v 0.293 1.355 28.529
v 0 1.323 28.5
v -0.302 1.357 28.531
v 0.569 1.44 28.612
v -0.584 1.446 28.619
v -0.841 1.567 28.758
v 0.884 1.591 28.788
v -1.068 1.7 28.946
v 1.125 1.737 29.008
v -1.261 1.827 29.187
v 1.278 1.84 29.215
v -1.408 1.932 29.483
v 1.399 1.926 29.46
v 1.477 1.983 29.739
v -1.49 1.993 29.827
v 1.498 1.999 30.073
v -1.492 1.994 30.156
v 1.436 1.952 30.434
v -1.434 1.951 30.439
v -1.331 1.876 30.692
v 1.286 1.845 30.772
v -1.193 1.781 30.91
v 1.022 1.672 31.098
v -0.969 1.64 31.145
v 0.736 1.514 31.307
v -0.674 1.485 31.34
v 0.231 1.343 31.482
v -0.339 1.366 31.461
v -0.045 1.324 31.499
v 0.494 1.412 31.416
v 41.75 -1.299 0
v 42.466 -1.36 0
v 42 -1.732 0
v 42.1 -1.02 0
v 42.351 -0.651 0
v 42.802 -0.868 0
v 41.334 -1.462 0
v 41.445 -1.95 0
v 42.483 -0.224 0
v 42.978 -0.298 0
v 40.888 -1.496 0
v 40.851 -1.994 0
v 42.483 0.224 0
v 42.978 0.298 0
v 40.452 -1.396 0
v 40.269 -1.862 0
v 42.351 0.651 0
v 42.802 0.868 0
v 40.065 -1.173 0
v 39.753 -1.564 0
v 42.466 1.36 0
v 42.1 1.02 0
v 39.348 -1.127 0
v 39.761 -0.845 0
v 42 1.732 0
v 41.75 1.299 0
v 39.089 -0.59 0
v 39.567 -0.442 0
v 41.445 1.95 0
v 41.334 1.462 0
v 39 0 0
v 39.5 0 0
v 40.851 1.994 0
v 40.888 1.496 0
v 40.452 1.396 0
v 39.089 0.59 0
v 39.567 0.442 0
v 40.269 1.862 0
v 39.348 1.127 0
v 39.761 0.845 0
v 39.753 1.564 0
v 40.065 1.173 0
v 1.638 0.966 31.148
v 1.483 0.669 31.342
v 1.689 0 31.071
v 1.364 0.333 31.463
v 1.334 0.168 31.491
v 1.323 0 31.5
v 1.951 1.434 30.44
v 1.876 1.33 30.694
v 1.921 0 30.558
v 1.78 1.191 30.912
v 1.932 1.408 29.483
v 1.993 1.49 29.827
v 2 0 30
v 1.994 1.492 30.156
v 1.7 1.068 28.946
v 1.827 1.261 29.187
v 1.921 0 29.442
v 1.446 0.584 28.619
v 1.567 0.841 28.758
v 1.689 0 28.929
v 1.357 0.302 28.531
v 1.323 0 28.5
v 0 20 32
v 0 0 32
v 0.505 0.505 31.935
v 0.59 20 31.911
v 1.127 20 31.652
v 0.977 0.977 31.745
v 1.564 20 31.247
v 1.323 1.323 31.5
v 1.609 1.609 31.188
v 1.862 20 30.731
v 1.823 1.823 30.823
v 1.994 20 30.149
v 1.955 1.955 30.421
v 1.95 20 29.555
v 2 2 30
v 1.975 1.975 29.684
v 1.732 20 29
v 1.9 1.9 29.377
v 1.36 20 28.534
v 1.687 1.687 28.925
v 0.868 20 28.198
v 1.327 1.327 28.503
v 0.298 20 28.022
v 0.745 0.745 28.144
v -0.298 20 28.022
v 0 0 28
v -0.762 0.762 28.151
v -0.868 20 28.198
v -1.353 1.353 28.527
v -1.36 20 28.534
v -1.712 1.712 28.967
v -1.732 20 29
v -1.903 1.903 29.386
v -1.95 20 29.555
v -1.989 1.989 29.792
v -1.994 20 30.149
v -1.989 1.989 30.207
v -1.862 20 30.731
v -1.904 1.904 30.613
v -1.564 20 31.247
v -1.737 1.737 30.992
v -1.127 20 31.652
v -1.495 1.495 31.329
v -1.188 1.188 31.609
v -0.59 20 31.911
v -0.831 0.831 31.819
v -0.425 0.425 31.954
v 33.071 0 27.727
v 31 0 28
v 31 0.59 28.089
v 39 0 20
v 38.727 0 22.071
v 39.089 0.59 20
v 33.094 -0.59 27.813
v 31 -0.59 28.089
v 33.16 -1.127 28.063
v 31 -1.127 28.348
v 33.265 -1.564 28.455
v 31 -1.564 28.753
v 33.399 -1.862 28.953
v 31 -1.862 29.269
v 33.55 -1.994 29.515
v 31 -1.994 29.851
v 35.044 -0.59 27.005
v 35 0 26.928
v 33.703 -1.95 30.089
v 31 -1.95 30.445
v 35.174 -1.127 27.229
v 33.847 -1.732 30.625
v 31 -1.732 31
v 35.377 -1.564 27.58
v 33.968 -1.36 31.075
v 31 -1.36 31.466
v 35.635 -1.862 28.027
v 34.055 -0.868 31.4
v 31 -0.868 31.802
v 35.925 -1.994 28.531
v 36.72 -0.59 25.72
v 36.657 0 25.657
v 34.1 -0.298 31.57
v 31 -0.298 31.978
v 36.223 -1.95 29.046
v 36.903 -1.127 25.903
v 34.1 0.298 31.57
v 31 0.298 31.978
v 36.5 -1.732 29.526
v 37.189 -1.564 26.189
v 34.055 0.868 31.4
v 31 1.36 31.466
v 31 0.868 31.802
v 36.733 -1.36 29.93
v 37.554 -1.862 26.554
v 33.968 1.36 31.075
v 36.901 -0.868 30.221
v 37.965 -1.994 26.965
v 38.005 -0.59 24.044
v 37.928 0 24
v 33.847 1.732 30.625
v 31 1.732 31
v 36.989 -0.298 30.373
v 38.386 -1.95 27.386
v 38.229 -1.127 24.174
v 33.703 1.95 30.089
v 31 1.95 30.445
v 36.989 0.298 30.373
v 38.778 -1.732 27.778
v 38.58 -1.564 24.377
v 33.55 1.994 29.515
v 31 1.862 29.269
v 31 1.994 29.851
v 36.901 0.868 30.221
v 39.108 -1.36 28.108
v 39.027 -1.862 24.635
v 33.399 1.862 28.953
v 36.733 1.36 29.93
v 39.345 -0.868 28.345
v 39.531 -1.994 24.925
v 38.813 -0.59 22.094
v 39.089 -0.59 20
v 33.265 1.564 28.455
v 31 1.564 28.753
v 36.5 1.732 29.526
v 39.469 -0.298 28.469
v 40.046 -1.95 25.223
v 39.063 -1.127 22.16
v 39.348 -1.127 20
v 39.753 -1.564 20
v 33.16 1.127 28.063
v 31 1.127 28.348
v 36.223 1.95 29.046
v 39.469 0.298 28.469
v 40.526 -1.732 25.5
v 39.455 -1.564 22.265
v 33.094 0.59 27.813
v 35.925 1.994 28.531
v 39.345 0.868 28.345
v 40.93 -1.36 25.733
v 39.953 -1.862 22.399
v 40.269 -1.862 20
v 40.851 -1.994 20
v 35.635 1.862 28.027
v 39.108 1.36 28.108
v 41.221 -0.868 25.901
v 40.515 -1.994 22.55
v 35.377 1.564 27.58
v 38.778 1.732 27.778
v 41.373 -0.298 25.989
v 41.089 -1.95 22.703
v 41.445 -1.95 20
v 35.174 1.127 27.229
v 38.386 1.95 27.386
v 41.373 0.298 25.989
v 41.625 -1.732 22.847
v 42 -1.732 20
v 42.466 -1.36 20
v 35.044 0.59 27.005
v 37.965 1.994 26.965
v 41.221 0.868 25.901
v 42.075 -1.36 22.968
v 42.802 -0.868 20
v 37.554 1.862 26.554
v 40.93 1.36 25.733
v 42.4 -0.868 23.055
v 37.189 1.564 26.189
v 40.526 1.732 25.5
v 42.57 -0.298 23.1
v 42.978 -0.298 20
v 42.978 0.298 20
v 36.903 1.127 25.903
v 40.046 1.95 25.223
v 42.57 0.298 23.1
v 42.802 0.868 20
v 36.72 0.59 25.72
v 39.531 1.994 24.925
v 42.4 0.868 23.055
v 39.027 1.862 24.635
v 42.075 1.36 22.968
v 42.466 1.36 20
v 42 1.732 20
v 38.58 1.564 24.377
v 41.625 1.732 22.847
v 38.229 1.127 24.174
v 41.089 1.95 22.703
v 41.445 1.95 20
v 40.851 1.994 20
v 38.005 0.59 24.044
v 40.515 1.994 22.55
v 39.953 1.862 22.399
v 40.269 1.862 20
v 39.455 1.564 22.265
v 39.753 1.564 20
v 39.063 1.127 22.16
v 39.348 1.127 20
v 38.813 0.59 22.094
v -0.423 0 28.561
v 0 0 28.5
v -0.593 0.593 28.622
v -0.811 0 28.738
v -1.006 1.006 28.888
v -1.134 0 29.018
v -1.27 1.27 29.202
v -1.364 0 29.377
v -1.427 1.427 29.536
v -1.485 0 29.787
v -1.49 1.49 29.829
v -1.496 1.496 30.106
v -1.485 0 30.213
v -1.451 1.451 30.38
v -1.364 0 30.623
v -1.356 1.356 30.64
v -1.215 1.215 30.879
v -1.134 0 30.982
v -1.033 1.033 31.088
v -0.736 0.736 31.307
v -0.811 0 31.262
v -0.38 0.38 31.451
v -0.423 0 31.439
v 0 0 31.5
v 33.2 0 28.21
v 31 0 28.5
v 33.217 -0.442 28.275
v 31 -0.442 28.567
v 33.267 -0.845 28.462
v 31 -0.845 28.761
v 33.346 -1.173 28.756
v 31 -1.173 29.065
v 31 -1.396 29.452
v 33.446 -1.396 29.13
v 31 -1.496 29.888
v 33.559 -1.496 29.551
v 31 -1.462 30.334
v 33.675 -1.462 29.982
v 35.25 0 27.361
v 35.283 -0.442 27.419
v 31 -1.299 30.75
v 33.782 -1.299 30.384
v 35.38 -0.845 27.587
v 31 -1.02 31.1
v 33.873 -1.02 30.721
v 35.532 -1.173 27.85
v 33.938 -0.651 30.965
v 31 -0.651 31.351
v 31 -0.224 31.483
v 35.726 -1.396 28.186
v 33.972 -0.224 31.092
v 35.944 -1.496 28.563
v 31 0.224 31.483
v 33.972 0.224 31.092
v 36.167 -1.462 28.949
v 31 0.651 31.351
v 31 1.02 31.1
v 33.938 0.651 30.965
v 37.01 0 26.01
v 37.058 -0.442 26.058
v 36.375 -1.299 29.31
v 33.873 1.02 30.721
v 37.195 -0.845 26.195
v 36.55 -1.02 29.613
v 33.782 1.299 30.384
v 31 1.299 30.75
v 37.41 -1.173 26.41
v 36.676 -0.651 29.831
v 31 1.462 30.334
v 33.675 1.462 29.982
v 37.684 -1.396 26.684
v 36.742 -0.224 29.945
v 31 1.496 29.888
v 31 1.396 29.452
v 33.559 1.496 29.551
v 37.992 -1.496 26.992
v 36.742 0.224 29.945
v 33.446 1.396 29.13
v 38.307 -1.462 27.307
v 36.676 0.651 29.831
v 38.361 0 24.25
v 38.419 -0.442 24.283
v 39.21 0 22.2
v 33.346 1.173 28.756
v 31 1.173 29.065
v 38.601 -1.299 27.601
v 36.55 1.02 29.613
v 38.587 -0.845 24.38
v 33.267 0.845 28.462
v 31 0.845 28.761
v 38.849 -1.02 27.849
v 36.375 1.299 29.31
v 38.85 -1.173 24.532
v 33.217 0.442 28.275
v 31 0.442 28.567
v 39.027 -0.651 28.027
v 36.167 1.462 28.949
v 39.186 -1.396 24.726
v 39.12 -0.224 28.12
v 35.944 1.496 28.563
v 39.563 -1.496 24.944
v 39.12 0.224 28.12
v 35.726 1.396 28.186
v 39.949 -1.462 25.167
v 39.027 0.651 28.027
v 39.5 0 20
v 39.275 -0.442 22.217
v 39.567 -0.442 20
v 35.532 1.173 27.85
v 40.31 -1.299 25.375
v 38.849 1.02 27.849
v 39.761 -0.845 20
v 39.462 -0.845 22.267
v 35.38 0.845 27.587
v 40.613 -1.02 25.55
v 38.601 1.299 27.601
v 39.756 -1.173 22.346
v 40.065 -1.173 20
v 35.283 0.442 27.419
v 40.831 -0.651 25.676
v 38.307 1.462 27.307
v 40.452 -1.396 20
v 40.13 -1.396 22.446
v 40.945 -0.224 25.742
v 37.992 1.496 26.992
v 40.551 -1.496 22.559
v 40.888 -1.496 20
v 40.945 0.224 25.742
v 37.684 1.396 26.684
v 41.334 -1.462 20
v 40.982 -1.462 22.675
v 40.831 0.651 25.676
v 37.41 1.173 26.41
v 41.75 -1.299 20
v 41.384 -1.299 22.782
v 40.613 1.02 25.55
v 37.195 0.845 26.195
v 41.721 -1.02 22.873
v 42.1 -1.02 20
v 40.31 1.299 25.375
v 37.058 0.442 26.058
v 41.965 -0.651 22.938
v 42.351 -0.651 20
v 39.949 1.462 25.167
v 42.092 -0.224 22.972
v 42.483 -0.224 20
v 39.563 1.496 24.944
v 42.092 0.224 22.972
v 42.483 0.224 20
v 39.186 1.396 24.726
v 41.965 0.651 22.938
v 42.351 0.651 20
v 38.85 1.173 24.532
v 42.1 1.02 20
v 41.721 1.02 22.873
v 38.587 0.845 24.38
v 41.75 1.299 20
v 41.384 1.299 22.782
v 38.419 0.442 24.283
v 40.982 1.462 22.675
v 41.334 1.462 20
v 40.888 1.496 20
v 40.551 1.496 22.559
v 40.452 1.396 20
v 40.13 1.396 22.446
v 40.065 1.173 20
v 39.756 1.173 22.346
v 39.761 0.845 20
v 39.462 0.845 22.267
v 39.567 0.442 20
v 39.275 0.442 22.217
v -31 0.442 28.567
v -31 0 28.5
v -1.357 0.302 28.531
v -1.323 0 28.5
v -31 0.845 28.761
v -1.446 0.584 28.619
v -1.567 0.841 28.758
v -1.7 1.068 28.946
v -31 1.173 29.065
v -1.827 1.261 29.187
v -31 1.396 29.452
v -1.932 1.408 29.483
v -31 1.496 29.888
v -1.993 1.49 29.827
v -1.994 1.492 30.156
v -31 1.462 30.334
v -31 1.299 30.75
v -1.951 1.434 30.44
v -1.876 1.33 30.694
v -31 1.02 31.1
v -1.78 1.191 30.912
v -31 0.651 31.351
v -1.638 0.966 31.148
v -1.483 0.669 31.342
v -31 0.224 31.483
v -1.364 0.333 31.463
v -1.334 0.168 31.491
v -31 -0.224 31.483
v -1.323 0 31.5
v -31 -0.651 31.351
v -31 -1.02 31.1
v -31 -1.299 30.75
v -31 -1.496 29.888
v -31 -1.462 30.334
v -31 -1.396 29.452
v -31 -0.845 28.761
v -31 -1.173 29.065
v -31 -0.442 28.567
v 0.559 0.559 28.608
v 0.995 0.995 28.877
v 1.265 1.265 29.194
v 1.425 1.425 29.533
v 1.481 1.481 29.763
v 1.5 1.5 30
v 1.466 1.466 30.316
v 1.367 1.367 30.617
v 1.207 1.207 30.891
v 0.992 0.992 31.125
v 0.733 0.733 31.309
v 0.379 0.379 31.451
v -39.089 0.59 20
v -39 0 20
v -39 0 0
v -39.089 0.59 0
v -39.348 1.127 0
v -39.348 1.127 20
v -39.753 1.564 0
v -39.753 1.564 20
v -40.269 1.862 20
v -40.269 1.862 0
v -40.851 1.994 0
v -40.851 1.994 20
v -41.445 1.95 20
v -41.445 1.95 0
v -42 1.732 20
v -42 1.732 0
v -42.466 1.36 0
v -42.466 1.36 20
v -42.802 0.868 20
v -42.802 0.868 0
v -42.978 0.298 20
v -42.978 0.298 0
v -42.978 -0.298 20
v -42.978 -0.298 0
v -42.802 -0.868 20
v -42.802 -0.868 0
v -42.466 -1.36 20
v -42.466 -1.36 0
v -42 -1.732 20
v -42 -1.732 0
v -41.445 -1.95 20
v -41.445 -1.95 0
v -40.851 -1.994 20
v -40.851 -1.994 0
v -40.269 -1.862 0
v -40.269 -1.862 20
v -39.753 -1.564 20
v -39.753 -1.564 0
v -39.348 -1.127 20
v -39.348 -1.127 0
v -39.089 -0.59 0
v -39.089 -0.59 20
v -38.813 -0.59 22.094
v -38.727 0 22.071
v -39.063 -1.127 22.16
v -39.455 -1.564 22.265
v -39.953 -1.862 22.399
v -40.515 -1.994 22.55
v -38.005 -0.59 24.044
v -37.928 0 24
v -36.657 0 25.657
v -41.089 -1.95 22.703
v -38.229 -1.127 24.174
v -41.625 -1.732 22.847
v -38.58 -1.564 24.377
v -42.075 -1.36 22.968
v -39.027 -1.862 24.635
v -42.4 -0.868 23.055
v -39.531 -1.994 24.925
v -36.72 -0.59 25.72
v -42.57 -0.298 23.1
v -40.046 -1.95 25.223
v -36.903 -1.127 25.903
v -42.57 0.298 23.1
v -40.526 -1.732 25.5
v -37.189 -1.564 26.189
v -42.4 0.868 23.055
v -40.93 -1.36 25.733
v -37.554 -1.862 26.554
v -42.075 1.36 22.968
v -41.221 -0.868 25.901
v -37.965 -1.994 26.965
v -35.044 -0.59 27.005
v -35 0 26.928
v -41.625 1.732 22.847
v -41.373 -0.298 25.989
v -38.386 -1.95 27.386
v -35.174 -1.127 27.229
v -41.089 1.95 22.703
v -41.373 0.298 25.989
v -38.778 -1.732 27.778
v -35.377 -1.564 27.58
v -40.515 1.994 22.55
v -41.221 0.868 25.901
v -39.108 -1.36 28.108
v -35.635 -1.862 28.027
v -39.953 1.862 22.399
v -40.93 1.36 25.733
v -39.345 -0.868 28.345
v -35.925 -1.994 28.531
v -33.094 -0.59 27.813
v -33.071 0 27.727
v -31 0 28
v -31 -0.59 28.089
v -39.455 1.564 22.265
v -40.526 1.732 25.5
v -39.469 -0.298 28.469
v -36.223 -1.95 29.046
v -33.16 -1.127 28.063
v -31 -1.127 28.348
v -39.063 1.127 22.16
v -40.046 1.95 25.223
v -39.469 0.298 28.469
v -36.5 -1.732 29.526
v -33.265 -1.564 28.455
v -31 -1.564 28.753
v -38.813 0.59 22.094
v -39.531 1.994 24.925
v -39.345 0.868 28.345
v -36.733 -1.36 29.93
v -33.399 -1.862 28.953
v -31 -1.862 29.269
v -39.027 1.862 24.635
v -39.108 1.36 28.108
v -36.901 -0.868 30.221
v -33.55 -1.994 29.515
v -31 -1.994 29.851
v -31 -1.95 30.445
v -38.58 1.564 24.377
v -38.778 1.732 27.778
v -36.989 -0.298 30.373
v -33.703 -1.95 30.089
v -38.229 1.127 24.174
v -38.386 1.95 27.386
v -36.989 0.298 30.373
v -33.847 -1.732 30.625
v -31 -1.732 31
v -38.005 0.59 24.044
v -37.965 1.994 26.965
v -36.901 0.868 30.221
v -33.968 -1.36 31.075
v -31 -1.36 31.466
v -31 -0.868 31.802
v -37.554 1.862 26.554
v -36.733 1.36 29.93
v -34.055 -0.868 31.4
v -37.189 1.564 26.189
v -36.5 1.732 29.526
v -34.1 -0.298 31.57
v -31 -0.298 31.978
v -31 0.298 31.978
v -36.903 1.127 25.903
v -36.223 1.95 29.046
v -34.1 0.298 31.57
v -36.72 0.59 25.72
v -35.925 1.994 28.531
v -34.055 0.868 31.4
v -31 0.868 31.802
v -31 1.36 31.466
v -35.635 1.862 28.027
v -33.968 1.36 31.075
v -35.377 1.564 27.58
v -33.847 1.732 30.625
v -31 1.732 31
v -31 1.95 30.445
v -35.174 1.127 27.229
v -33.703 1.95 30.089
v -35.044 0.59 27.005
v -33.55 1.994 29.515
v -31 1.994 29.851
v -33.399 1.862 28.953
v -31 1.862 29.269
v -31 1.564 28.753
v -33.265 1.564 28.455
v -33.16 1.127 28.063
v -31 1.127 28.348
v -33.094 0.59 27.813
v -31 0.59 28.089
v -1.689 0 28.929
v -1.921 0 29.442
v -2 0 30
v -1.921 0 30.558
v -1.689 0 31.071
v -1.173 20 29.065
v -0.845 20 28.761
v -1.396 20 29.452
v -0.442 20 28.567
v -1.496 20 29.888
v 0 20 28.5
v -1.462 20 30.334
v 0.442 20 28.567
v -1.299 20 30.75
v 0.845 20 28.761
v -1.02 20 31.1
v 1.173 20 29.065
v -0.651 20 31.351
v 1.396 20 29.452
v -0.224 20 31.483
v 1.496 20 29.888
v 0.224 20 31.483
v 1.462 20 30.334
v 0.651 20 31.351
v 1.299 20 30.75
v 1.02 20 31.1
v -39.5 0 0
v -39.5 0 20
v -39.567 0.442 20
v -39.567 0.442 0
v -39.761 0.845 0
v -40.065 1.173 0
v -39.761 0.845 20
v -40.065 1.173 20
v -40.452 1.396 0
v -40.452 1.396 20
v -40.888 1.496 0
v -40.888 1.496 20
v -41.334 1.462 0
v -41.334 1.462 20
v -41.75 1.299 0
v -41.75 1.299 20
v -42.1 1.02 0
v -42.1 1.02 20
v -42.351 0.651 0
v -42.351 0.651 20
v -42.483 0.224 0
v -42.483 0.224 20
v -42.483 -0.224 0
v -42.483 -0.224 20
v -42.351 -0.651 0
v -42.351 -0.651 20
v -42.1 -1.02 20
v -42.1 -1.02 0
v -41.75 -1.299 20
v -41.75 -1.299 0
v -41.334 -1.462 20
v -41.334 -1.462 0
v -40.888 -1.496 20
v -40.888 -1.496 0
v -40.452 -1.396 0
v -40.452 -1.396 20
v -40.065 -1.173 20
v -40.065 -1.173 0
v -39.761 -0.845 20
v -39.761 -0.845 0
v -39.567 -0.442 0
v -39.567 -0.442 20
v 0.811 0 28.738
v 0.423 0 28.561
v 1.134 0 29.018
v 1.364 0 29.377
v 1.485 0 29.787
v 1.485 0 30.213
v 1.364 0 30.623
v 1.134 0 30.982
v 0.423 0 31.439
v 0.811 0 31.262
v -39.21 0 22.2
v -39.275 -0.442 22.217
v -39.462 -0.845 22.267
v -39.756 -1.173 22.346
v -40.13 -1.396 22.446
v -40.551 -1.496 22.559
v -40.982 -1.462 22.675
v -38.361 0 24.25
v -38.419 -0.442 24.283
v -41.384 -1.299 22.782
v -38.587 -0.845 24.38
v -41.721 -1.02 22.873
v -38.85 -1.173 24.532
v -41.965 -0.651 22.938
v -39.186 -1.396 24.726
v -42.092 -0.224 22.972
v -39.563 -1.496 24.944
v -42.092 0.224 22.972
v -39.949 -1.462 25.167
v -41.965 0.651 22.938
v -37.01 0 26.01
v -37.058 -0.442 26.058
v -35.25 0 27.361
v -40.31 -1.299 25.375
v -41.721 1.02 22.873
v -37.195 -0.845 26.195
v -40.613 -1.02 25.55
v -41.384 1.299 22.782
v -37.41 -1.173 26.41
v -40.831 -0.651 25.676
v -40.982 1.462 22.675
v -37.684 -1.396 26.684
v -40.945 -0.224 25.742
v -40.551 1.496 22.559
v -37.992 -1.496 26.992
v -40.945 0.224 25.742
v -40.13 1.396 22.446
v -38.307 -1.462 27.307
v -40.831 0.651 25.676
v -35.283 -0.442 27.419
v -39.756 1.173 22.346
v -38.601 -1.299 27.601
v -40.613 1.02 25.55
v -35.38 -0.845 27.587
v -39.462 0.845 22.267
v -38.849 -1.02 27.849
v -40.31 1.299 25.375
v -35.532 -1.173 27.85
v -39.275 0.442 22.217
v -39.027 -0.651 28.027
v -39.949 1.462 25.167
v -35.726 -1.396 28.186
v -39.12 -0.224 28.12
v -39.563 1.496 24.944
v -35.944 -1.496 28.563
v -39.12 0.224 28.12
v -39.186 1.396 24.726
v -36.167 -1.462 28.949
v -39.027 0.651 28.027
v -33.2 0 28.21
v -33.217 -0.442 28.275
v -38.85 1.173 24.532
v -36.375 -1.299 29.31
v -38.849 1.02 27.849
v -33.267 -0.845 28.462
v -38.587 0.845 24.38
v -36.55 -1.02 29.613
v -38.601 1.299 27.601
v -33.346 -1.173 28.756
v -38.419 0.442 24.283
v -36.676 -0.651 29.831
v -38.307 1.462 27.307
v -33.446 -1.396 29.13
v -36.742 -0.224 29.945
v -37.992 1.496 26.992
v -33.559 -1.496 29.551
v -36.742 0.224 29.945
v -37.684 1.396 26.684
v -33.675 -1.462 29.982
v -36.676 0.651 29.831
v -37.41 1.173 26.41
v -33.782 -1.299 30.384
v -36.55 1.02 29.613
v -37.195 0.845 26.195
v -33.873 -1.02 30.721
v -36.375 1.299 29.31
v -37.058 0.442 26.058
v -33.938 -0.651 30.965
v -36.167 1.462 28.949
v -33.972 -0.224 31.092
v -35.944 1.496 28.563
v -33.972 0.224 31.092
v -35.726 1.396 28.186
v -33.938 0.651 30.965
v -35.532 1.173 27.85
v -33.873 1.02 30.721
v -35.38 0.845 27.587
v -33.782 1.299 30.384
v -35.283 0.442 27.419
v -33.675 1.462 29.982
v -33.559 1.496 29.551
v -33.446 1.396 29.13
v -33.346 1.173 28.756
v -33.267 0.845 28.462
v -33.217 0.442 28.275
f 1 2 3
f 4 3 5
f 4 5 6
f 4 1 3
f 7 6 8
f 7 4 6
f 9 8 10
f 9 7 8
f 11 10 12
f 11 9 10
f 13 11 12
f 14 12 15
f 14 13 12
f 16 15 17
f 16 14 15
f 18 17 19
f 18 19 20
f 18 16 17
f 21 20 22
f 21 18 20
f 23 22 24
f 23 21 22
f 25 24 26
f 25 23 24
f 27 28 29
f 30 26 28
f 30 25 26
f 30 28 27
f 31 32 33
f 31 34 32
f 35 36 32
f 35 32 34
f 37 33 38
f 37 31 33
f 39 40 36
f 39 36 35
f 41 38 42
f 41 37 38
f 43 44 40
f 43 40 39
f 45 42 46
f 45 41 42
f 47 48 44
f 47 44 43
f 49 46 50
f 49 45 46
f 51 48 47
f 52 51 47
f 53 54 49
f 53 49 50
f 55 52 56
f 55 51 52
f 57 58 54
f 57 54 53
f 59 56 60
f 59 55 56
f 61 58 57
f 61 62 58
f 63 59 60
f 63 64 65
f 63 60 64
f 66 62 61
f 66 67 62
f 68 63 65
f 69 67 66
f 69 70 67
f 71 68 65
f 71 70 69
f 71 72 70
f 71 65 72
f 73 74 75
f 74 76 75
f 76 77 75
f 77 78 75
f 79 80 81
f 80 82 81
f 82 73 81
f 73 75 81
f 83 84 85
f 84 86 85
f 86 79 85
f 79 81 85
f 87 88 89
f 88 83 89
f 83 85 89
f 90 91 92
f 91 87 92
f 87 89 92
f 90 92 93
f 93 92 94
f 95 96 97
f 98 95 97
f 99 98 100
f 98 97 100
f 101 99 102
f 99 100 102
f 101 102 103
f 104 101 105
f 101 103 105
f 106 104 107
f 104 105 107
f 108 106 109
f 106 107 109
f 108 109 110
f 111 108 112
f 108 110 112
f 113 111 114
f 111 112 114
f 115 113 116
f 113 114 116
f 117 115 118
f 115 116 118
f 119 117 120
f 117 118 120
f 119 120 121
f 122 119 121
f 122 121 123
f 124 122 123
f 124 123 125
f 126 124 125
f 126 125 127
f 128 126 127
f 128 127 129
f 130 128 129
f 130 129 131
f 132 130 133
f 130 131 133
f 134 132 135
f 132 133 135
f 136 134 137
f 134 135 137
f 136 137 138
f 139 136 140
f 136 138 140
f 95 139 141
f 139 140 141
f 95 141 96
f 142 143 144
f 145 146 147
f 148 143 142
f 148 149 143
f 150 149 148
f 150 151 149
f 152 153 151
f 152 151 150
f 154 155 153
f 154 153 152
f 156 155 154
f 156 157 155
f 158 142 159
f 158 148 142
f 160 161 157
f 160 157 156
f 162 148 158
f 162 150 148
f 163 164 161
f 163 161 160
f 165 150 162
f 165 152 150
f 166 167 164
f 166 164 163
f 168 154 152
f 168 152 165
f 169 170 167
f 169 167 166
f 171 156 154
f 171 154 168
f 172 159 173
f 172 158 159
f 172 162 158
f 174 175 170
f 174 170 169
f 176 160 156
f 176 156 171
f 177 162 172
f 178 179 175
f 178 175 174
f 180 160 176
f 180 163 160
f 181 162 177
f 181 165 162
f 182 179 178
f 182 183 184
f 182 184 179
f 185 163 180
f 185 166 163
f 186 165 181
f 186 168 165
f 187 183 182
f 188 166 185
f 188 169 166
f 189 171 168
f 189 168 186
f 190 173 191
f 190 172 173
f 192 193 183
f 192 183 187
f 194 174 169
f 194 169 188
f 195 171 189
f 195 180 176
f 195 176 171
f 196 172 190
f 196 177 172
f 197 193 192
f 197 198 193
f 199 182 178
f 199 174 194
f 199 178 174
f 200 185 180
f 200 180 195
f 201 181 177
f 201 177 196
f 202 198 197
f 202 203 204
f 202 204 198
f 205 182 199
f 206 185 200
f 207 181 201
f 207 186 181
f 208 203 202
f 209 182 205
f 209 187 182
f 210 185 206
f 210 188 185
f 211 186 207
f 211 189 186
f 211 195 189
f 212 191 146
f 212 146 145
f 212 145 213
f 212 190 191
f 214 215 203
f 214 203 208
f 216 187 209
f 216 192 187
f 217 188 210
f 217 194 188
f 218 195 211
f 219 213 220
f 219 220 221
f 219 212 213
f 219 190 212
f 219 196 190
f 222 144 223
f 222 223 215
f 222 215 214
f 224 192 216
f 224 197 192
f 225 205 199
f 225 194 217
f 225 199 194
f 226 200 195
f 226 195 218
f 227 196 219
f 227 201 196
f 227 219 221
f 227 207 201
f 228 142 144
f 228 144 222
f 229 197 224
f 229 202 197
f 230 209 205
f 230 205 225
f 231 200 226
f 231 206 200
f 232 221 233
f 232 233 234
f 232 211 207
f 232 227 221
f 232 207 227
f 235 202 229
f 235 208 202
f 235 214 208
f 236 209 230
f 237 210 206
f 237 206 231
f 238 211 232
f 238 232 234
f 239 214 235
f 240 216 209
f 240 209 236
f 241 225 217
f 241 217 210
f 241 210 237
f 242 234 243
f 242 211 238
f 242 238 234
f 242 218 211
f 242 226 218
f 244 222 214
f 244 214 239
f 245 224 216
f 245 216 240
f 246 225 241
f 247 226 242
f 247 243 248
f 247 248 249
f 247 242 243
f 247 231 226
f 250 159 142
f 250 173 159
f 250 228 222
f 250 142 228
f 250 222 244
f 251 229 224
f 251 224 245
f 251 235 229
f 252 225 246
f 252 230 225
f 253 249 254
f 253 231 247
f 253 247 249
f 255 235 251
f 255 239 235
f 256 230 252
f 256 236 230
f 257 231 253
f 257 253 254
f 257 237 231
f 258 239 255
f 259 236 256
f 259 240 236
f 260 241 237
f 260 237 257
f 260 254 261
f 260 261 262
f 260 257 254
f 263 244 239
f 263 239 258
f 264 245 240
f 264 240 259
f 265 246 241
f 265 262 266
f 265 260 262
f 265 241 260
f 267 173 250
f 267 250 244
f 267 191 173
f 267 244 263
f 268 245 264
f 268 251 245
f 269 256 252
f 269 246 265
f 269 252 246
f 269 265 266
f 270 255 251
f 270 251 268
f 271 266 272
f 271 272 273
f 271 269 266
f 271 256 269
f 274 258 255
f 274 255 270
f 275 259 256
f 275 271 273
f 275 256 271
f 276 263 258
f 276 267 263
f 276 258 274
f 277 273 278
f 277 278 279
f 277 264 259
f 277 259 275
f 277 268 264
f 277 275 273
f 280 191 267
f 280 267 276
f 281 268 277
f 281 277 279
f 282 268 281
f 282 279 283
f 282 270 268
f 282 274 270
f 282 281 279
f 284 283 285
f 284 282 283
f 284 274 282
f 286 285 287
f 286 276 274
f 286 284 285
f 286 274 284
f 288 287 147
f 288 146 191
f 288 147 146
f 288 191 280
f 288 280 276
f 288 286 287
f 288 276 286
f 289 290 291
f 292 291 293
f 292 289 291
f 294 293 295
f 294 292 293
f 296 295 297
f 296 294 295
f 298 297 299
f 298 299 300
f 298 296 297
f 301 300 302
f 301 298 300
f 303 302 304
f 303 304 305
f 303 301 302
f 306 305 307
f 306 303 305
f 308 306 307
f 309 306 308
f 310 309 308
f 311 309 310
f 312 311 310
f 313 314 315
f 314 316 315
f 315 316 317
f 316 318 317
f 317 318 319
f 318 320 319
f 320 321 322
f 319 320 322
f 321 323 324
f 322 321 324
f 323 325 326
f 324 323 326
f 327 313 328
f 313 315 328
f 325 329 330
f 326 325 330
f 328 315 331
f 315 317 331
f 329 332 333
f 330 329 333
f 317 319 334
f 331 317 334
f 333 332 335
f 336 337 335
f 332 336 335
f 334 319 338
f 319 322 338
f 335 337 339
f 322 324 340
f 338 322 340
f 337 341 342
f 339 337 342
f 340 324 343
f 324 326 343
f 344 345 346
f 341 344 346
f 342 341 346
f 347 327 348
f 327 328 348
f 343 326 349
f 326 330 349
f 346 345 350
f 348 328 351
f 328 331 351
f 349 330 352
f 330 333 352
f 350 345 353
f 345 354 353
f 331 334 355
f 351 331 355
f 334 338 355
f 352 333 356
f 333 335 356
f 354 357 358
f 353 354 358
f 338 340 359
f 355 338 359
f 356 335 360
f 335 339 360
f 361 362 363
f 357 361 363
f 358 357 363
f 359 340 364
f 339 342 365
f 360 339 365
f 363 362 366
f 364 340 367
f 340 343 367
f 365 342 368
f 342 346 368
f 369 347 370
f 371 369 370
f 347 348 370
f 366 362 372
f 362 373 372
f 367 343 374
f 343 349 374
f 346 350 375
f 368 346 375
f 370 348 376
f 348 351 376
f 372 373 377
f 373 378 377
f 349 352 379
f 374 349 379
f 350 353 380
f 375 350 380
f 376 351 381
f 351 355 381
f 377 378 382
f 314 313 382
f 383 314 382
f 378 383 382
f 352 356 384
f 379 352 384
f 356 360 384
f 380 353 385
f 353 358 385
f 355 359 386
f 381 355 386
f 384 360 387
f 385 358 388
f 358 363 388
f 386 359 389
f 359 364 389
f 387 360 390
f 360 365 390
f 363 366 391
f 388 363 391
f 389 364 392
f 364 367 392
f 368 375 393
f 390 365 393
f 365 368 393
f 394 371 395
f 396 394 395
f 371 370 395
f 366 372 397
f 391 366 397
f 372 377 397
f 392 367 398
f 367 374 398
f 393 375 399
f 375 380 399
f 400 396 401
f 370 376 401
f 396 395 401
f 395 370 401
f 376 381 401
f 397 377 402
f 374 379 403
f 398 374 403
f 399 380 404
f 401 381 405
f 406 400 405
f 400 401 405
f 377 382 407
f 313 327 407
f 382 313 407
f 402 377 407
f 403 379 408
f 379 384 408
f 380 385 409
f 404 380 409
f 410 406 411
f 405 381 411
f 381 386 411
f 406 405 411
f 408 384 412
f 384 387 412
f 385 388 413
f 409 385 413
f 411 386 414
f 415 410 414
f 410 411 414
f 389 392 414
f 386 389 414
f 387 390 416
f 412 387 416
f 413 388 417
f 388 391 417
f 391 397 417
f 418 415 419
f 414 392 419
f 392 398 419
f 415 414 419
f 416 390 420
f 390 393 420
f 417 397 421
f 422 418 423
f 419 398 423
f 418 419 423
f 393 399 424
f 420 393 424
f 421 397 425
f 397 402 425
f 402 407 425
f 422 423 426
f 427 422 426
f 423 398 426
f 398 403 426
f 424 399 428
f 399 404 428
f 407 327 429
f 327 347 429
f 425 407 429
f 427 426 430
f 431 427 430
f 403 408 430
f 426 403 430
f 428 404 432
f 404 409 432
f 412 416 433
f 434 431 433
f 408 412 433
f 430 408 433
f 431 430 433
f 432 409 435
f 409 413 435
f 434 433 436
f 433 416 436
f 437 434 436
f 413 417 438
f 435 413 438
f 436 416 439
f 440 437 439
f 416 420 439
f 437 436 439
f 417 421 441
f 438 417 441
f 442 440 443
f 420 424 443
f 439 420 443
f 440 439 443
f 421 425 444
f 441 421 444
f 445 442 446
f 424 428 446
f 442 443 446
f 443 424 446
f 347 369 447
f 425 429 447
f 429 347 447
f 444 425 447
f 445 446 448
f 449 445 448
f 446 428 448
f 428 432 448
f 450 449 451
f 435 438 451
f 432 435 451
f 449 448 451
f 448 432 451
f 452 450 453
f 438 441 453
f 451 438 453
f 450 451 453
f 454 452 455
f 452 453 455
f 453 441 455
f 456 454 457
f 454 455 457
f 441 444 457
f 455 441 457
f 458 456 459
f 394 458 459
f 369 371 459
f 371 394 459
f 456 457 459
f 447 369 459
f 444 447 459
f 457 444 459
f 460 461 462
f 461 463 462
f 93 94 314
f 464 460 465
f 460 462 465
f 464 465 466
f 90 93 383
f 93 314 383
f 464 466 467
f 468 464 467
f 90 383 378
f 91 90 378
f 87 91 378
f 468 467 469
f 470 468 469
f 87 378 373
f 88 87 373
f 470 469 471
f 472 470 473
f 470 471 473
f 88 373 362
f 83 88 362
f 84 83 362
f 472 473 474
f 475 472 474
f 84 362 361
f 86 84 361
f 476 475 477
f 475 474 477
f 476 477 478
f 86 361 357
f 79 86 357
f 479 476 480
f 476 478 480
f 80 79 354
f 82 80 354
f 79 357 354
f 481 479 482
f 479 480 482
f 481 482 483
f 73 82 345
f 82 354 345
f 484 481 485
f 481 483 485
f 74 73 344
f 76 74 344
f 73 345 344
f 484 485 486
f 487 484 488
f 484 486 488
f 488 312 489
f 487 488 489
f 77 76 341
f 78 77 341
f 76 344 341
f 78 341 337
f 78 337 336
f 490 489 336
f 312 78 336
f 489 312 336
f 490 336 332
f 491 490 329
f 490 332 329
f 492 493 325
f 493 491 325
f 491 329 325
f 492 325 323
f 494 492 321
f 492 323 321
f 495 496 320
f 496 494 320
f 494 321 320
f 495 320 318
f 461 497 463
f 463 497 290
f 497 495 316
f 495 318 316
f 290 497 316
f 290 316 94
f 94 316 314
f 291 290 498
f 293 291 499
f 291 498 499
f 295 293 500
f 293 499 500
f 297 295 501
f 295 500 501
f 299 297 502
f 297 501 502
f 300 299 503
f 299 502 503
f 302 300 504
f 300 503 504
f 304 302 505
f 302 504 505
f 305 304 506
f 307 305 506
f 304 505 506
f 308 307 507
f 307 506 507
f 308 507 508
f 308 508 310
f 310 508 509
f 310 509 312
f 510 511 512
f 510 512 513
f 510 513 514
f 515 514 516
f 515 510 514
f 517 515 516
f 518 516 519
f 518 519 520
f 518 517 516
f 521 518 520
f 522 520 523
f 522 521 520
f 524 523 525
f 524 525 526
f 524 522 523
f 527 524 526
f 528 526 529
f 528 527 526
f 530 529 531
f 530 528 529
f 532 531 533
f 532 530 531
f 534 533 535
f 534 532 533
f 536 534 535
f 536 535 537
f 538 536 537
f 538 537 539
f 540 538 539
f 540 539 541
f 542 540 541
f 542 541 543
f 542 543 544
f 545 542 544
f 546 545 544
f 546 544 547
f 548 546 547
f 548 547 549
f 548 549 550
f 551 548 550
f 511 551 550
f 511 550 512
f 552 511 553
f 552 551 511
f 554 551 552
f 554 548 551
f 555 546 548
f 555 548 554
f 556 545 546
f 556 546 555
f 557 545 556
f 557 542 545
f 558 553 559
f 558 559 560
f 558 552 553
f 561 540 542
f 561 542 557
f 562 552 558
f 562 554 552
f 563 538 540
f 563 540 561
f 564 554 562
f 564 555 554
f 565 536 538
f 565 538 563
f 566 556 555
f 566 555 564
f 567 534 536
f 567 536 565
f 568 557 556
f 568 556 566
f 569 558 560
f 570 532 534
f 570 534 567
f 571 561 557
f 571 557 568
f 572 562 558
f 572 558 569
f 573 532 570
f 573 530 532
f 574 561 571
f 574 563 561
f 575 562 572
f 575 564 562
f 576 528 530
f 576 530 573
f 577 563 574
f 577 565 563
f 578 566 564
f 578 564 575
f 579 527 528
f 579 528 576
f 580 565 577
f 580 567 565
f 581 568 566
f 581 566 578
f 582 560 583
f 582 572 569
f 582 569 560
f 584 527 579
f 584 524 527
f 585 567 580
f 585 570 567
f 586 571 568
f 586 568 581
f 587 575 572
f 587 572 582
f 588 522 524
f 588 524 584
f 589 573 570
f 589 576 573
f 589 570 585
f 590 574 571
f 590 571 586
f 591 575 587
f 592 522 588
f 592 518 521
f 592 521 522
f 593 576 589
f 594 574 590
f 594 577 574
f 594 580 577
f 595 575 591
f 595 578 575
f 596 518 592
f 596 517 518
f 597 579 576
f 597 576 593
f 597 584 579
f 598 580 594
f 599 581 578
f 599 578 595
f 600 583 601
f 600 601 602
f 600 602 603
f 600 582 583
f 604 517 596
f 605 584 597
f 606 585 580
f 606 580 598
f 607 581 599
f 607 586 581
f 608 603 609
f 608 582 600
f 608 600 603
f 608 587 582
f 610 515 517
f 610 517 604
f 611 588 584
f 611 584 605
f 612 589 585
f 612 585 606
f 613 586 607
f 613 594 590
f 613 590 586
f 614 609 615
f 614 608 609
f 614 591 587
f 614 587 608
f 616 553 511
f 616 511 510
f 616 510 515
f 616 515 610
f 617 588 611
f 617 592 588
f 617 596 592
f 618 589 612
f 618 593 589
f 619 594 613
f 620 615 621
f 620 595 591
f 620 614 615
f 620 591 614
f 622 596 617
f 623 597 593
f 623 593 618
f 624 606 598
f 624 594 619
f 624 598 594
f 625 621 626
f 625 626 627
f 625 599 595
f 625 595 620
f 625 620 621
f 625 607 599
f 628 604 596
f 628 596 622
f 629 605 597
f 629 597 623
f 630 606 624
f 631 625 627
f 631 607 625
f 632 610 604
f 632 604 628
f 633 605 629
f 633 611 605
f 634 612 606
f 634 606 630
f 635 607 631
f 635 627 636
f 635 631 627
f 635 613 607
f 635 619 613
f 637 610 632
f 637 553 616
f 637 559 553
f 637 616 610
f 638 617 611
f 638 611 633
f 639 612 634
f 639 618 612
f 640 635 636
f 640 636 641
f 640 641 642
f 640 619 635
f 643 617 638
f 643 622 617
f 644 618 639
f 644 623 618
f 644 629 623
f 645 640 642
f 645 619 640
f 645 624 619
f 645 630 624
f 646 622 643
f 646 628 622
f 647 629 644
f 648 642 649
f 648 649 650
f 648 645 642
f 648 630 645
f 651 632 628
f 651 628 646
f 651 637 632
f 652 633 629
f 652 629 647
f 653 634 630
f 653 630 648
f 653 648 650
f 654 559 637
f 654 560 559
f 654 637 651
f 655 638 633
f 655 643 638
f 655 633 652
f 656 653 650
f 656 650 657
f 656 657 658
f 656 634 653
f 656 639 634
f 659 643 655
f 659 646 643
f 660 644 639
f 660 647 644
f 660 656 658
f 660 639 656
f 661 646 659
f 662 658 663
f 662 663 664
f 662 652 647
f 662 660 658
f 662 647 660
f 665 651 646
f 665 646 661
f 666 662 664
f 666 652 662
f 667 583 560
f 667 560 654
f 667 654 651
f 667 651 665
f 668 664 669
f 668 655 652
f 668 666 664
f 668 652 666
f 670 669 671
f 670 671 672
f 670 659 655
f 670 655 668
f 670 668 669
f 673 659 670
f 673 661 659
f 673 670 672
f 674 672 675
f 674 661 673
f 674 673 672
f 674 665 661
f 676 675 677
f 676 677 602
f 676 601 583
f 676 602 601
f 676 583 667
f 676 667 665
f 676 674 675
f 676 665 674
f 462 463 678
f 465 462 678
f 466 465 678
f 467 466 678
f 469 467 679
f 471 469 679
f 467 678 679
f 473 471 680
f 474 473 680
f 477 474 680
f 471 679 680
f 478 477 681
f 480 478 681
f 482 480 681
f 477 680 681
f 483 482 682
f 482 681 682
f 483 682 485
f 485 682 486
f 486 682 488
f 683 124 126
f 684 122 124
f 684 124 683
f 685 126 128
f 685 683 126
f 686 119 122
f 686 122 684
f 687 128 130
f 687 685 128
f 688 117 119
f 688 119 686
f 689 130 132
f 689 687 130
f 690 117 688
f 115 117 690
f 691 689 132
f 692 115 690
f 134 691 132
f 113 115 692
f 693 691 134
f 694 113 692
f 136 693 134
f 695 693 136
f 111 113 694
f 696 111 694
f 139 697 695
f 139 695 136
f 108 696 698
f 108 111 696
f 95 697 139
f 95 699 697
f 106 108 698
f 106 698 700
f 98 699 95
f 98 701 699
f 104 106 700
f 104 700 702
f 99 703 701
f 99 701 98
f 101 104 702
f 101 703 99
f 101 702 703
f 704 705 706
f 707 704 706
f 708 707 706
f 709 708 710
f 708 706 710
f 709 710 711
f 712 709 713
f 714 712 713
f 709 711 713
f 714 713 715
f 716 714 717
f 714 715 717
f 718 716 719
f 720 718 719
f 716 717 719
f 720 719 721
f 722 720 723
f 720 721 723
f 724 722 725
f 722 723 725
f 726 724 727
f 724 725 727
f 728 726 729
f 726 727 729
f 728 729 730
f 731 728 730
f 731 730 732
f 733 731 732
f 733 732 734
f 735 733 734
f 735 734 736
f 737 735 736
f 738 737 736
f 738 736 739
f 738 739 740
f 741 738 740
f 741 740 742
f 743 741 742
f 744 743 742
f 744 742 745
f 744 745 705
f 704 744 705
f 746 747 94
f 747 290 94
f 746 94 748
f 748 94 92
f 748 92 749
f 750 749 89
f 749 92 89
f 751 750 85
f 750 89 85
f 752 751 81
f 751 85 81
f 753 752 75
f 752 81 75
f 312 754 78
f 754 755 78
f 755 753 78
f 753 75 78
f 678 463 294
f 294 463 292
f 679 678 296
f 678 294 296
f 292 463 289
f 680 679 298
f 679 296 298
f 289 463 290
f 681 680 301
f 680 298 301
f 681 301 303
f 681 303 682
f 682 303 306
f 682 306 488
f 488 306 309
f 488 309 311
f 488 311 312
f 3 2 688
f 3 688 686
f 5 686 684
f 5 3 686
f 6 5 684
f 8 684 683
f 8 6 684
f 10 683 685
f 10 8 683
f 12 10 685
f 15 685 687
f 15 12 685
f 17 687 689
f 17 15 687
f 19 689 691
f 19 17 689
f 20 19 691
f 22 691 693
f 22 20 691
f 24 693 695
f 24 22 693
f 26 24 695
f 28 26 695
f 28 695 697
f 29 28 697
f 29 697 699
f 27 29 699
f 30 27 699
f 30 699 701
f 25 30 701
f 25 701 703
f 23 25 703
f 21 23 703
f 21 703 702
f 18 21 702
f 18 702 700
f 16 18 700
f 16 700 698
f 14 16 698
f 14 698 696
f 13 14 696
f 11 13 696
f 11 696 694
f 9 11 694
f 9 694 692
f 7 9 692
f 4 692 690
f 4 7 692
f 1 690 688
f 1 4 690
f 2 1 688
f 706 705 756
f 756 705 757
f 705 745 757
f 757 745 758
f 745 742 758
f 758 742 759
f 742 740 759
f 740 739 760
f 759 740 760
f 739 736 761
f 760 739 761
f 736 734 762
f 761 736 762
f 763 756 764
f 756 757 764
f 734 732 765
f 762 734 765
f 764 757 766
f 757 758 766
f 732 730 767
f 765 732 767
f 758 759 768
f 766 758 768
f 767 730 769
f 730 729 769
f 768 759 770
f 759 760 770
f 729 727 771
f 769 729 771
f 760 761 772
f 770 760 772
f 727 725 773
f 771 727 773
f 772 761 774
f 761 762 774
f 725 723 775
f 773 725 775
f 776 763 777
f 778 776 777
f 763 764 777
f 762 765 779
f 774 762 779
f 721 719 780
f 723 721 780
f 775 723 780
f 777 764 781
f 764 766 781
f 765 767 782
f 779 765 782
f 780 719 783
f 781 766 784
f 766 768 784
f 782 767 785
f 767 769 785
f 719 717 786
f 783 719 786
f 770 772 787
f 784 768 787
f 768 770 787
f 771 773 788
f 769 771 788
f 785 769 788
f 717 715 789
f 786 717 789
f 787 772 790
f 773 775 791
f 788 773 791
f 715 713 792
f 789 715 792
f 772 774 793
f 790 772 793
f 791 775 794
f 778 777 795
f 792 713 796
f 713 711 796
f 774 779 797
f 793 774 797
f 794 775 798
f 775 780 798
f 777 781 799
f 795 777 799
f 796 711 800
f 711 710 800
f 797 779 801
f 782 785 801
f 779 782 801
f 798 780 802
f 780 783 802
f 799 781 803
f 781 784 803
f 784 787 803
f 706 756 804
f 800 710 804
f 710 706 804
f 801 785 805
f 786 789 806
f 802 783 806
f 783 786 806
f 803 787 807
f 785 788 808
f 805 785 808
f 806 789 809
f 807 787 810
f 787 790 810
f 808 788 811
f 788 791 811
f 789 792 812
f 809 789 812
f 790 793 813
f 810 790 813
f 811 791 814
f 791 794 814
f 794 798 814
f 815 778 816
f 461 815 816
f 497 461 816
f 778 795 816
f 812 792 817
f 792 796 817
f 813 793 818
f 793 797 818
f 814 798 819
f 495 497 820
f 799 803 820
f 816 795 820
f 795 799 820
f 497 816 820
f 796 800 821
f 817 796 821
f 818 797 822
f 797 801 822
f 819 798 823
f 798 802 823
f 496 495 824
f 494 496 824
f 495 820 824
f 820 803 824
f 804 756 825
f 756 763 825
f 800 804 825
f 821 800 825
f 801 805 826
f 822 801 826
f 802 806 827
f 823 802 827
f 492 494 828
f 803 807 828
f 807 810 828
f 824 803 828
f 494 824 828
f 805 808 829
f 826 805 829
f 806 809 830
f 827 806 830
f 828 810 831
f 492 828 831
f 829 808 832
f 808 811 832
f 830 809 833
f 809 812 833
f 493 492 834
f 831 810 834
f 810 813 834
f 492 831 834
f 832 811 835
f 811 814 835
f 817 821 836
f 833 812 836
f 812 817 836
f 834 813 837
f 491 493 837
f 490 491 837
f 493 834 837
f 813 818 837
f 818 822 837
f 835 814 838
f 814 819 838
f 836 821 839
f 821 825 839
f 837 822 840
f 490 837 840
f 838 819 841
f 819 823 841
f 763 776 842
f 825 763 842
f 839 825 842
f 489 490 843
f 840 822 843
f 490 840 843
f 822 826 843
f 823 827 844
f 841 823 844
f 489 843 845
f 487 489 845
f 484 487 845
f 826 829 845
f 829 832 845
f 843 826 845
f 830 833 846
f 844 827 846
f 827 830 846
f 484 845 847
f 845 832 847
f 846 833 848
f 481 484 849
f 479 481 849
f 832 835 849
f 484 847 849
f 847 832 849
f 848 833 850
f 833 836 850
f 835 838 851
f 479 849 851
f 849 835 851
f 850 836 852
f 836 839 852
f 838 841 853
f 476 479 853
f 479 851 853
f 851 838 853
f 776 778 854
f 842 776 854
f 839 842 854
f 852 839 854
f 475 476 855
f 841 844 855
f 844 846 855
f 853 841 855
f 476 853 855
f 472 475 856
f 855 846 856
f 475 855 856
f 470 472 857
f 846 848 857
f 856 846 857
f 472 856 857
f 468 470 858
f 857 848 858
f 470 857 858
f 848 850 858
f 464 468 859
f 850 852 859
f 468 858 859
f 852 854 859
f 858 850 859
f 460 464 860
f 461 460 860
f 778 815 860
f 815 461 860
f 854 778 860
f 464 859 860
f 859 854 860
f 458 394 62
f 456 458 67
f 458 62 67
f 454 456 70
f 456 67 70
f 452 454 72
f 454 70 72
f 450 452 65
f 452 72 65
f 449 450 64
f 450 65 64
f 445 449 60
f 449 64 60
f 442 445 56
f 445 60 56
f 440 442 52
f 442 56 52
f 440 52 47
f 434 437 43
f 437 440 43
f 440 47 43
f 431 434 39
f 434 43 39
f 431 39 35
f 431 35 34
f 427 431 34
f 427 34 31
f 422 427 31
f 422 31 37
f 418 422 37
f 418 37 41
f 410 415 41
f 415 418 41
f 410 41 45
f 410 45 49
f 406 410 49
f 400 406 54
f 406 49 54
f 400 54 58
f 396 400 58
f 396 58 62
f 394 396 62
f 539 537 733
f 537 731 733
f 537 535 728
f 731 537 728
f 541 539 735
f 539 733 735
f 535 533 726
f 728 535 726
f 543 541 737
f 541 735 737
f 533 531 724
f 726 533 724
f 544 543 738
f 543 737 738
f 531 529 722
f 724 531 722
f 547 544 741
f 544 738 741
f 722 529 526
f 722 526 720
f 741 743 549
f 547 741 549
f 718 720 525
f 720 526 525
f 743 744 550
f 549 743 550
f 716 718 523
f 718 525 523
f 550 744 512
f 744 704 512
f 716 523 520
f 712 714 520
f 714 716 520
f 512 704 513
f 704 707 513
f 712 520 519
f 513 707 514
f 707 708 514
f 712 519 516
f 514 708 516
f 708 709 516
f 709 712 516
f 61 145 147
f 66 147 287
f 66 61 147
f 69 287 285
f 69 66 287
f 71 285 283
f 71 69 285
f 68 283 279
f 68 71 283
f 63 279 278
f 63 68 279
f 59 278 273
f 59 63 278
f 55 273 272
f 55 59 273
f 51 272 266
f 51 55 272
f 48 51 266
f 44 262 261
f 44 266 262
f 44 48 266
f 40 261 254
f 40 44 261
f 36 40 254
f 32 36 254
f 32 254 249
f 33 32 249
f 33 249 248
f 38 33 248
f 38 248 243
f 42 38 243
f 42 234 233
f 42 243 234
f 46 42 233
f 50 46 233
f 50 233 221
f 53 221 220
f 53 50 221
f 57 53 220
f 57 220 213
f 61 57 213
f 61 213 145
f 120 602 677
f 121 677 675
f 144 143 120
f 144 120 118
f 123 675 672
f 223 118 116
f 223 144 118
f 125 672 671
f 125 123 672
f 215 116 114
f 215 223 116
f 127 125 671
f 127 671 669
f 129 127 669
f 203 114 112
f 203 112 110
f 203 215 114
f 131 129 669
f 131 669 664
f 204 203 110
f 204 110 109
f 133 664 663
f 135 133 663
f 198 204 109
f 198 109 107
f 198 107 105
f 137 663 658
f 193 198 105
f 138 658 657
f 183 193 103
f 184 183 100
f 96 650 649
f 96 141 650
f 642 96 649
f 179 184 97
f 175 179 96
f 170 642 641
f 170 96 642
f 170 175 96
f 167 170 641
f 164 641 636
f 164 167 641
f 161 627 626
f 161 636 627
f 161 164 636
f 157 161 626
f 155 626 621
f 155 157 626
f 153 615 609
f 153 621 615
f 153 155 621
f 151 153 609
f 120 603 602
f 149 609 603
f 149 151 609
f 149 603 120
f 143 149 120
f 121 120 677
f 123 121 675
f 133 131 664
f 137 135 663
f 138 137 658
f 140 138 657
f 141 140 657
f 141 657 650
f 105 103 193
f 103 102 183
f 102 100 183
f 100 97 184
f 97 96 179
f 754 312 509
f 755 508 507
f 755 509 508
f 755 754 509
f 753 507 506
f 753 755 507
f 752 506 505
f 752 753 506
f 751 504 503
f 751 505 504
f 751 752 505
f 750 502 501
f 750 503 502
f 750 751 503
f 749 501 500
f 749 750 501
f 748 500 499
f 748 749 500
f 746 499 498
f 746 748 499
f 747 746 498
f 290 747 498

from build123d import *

# Parameters (mm, degrees)
SKETCH3_R           = 2
SKETCH3_R_2         = 1.5
SKETCH4_R           = 2
SKETCH4_R_2         = 1.5
BOSS_EXTRUDE1_DEPTH = 20


with BuildPart() as part:
    # Sweep1: sweep along a path in Sketch2
    with BuildLine(Plane(origin=(0, 0, 0), x_dir=(1, 0, 0), z_dir=(0, 1, 0))) as sweep1_path:
        Line((-41, 0), (-41, -20))
        ThreePointArc((-41, -20), (-38.071067812, -27.071067812), (-31, -30))
        Line((-31, -30), (31, -30))
        ThreePointArc((31, -30), (38.071067812, -27.071067812), (41, -20))
        Line((41, -20), (41, 0))
    # Sketch3 → Sweep1 (sweep)
    with BuildSketch(Plane.XY):
        with Locations((-41, 0)):
            Circle(SKETCH3_R)
        with Locations((-41, 0)):
            Circle(SKETCH3_R_2, mode=Mode.SUBTRACT)
    sweep(path=sweep1_path.line)

    # Sketch4 → Boss-Extrude1 (add)
    with BuildSketch(Plane(origin=(0, 0, 0), x_dir=(1, 0, 0), z_dir=(0, 1, 0))):
        with Locations(Location((0, -30, 0), (0, 0, 270))):
            Circle(SKETCH4_R)
        with Locations(Location((0, -30, 0), (0, 0, 90))):
            Circle(SKETCH4_R_2, mode=Mode.SUBTRACT)
    extrude(amount=BOSS_EXTRUDE1_DEPTH)


solid = part.part
